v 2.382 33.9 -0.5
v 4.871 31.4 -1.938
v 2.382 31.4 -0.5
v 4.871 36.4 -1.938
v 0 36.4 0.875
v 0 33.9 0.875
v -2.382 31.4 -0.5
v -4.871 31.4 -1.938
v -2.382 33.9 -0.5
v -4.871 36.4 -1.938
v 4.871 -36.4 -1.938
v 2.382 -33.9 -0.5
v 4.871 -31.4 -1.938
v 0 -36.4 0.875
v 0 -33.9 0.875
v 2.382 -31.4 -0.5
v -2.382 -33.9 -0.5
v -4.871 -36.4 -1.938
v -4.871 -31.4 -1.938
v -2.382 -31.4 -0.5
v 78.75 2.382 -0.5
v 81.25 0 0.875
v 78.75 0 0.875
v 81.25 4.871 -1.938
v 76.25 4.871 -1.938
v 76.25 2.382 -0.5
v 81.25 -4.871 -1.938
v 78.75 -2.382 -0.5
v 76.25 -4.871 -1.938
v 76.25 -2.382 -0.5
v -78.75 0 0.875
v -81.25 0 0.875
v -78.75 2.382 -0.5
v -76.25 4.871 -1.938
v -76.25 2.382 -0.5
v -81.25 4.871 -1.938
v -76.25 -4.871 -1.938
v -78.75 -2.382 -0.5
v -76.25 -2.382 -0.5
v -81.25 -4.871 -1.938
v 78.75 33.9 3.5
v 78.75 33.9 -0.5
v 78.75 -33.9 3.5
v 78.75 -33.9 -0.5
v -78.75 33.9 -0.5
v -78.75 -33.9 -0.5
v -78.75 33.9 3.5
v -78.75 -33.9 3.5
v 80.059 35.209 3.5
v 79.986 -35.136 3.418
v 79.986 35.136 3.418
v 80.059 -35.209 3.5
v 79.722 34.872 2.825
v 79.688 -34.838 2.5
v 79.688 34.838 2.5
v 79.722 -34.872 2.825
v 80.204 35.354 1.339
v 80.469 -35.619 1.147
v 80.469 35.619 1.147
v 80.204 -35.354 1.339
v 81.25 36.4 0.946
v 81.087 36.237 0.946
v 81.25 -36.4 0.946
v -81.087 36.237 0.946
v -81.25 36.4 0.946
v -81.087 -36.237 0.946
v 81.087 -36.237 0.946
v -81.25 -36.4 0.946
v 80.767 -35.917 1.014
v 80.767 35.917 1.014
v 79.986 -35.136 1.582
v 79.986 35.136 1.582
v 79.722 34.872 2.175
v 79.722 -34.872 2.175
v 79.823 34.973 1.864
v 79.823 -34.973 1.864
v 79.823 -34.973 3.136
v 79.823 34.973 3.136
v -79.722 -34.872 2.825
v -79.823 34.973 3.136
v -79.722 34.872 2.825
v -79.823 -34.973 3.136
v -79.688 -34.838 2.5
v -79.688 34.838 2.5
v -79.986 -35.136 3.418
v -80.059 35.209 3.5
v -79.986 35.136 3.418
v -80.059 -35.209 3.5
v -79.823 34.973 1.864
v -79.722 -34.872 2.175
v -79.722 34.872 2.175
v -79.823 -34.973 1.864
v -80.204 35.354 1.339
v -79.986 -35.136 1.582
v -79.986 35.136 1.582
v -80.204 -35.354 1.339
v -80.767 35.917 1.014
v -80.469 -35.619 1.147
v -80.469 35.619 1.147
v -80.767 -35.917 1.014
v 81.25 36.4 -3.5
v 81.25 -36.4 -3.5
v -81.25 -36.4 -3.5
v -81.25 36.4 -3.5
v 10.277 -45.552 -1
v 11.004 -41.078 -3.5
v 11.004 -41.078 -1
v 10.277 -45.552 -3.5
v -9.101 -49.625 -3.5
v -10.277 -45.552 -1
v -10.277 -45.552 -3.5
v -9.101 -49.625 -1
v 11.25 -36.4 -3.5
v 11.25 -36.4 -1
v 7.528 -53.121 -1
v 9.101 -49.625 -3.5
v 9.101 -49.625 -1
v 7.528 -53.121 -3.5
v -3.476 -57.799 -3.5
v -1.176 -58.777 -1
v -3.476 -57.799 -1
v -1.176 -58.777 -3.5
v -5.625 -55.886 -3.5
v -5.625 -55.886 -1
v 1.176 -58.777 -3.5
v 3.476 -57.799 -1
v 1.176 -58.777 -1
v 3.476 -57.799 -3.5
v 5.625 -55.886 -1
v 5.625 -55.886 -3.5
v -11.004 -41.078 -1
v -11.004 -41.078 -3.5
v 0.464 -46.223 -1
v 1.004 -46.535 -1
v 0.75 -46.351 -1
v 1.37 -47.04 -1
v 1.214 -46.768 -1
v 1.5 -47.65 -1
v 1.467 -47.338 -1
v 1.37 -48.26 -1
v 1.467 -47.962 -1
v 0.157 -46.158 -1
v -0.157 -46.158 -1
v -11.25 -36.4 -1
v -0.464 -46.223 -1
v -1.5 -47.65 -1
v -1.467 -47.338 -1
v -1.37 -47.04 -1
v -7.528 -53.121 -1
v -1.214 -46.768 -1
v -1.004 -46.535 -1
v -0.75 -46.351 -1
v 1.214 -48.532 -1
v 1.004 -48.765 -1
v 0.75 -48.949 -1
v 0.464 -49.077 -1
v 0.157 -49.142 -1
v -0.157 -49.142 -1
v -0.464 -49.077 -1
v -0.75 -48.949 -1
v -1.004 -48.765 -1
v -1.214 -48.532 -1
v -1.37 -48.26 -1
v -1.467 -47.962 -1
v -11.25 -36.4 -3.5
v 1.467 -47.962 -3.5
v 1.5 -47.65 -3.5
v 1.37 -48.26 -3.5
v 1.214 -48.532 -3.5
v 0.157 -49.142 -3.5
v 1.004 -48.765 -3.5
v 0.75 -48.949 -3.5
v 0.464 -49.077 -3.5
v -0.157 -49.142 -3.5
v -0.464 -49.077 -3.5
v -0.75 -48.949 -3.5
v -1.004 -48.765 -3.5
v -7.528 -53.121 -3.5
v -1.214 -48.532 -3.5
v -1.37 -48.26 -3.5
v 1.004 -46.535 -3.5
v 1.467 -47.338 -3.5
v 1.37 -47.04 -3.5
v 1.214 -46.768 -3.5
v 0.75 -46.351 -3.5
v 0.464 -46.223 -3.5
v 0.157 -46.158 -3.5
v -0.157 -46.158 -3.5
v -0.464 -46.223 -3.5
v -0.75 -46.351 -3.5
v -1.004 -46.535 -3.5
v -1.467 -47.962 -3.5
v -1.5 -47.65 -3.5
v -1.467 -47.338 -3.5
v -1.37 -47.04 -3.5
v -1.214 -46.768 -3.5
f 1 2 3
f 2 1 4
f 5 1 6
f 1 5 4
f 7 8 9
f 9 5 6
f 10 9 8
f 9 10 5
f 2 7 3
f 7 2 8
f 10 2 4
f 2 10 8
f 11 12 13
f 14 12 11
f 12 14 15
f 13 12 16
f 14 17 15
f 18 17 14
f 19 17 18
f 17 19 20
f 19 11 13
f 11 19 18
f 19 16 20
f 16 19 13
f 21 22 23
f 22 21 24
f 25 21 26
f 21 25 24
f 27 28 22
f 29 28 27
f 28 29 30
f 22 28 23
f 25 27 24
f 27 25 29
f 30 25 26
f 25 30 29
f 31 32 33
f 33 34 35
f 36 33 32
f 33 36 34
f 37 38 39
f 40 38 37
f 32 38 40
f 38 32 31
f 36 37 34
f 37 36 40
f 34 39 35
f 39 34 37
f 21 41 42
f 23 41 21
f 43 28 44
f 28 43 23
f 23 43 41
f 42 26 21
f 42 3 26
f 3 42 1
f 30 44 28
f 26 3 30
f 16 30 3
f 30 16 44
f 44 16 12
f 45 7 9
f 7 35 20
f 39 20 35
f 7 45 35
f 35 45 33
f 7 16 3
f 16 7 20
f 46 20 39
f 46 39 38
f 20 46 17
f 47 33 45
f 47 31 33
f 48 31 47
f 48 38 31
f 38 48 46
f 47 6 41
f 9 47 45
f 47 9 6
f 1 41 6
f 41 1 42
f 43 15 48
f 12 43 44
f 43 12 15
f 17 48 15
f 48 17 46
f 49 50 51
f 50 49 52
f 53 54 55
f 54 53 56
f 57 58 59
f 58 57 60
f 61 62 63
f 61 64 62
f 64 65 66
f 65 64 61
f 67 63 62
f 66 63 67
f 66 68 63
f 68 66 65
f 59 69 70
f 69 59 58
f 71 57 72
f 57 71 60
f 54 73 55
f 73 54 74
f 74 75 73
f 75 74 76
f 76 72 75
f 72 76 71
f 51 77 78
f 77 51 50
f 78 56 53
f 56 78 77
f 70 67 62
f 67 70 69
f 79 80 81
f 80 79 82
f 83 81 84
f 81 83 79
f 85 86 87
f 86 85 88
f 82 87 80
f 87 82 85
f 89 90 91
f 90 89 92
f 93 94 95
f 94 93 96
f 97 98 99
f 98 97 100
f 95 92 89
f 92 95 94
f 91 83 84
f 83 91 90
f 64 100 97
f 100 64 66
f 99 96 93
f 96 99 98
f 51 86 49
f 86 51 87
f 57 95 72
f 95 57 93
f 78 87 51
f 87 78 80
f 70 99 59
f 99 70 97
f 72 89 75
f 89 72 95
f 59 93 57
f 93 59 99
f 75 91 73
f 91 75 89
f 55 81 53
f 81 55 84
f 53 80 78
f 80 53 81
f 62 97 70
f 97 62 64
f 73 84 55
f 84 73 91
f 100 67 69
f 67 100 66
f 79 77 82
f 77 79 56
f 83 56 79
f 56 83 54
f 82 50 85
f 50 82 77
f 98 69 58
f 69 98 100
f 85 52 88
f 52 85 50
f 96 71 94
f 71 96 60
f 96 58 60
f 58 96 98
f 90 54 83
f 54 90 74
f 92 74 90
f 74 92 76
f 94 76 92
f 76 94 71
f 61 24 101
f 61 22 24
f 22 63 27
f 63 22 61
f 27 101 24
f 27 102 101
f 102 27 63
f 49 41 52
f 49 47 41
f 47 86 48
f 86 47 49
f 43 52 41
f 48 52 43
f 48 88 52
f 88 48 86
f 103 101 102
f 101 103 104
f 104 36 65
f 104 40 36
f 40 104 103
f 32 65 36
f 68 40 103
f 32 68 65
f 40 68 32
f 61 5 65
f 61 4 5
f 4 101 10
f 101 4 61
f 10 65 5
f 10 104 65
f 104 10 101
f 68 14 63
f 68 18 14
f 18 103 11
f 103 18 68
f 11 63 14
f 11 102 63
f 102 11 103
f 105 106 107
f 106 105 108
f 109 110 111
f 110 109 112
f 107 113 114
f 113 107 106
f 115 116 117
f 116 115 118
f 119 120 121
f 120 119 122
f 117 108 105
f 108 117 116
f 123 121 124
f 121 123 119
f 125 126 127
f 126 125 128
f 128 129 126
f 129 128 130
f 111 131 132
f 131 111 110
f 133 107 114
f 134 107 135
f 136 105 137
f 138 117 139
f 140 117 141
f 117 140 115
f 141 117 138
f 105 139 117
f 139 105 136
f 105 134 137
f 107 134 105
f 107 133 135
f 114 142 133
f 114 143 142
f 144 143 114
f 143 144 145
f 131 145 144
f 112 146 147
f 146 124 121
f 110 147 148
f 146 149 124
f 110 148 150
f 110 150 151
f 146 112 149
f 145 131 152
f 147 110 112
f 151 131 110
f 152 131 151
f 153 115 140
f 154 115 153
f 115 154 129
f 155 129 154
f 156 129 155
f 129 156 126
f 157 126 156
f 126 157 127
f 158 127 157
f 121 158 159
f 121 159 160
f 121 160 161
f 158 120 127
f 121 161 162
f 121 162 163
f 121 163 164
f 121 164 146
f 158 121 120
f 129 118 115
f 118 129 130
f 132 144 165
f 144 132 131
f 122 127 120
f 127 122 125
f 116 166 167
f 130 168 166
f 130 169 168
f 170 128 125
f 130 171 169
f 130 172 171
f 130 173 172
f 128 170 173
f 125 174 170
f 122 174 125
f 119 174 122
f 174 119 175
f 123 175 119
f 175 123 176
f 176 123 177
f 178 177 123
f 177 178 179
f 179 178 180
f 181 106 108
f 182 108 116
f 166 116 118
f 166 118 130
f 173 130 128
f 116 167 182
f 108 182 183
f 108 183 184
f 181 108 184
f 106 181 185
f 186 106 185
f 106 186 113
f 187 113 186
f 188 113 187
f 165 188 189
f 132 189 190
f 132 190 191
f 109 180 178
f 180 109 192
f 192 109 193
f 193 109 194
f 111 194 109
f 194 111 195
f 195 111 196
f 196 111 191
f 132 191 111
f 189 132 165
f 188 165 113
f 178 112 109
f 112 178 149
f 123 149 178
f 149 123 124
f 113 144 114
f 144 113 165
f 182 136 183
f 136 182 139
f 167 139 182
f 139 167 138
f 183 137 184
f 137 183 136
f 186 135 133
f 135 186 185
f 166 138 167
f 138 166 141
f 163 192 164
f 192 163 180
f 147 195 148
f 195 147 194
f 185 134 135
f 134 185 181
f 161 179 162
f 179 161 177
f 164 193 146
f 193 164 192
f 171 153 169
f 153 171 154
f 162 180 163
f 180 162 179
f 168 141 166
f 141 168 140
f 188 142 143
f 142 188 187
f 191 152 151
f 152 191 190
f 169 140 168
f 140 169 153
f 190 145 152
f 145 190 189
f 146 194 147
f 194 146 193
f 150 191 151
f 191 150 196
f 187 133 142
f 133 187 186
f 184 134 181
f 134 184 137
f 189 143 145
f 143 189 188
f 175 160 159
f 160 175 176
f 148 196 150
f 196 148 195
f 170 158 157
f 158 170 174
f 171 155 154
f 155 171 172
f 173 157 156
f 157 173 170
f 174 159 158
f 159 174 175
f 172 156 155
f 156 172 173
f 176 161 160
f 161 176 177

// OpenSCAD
//------------------Variables------------------\\ 

		//----Global Values----\\
			//The default unit in OpenSCAD is mm and this unit variable allows one to change the variables in the code with units other than mm. Default is 1, for mm, but cm is 10 and inches is 25.4. Note that this entails that you change EVERY variable (except maybe sfn)  so that one piece of the model is not ridiculously bigger/smaller than the other parts. 
				unit=1;

			//The detail in the cylinders/spheres of the shape.
				sfn=30;

		//----Bill Specifics----\\

			//The length of the bill.
				billength= 157.5;

			//The width of the bill. 
				billwidth = 67.8;

			//The thickness of the frame. 
				framethick = 5;
			
			//Bottom Thickness
				botthick = 2 ;

		//----Frame Specifics----\\

			//The border of the frame length-wise. This is the measurement from the inside of the frame to the outisde on the length (x) axis. The cylinders that shape the frame use this measurement.
				xframe = 5;

			//The border of the frame width-wise. This is the measurement from the inside of the frame to the outisde on the width (y) axis.
				yframe = 5;
		
			//How prominent the frame shaping is. Play with this value. Default is 2.
				frameshapethick = 1.6;

			//How raised the frame shaping is. Play with this value as well. 
				frameshaperaise = 0;
		
	//----Paper clip slit size----\\\
		//Width of the paperclip slit. Adjust this value if as you want. 
		slitwidth = 10;
		
		//Height of the slit. This is actually a size control but it mainly changes the size.
		slitheight = 7.5;

		//Where the slit is. Slit is in the middle by default but depending on size you may have to raise or lower this value.
		slitlift =-3;

		//Shape of slit in sides. Default is 3 (triangle) as its overhangs are not unbearable.
		slitshape=3;

		//Slit scale (x,y,z)
		slitscalex= 0.5;
		slitscaley= 1.5;
		slitscalez= 1;
	
	//----Hook sizing----\\
		//Hook size
		hooksize=22.5;

		//Hook hole size
		hookhole=3;

		//Hook thickness
		hookthick=2.5;

//-------------------Modules-------------------\\ 

	//----Basic Frame Shapes----\\
		module bill() {
			cube([billength*unit, billwidth*unit,framethick*unit], center=true);
		}

		module outsideframe() { 
			cube([(billength+xframe)*unit, (billwidth+yframe)*unit, (framethick+botthick)*unit], center=true);
		}

	//----Frame shaping.----\\
		//Frame shaping cylinder on the X Axis.
			module xfsc() {
				cylinder(r=(framethick*unit)/(frameshapethick*2), h=(billwidth+yframe)*unit+xframe, center=true, $fn=sfn);
			}

		//Frame shaping cylinder on the Y Axis.
			module yfsc() {
				cylinder(r=(framethick*unit)/(frameshapethick*2), h=(billength+xframe)*unit+yframe, center=true, $fn=sfn);
			}

		//Frameshaping general module
			module frameshaping() {
				translate([(billength/2)*unit+xframe/2, 0, (framethick/2)*unit]) {
					rotate([90,0,0]) {
						xfsc();
					}
				}
				translate([(-billength/2)*unit-xframe/2, 0, (framethick/2)*unit]) {
					rotate([90,0,0]) {
						xfsc();
					}
				}

				translate([0, (billwidth/2)*unit+yframe/2, (framethick/2)*unit]) {
					rotate([90,0,90]) {
						yfsc();
					}
				}
				translate([0, (-billwidth/2)*unit-yframe/2, (framethick/2)*unit]) {
					rotate([90,0,90]) {
						yfsc();
					}
				}
			}

	



	//A slit on every side for a paper clip to hold it down
	module clipslit() {
		translate([0, ((billwidth+yframe)/2)*unit, slitlift*unit]) {
			rotate([0,270,90]) {
				scale([slitscalex,slitscaley,slitscalez]) {
					cylinder(r=(slitheight/2)*unit, h=slitwidth*unit, $fn=slitshape, center=true);
				}
			}
		}
		translate([0, ((billwidth+yframe)/2)*-unit, slitlift*unit]) {
			rotate([0,270,90]) {
				scale([slitscalex,slitscaley,slitscalez]) {
					cylinder(r=(slitheight/2)*unit, h=slitwidth*unit, $fn=slitshape, center=true);
				}
			}
		}
		translate([((billength+xframe)/2)*unit, 0, slitlift*unit]) {
			rotate([0,270,0]) {
				scale([slitscalex,slitscaley,slitscalez]) {
					cylinder(r=(slitheight/2)*unit, h=slitwidth*unit, $fn=slitshape, center=true);
				}
			}
		}
		translate([-unit*((billength+xframe)/2), 0, slitlift*unit]) {
			rotate([0,270,0]) {
				scale([slitscalex,slitscaley,slitscalez]) {
					cylinder(r=(slitheight/2)*unit, h=slitwidth*unit, $fn=slitshape, center=true);
				}
			}
		}				
	}

		
	module hook() {
		translate([0,-((billwidth+xframe)/2)*unit, (-(framethick+botthick)/2)*unit ]) {
			difference() {
				scale([1,2,1]) {
					cylinder(r=(hooksize/2)*unit, h=hookthick*unit, $fn=sfn);
				}
				translate([(-hooksize/2)*unit, 0]) {
					cube([hooksize*unit, hooksize*unit, hookthick*unit]);
				}
				translate([0, (-hooksize/2)*unit, 0]) {
					cylinder(r=(hookhole/2)*unit, h=hookthick*unit, $fn=sfn);
				}
			}
		}
	}


	//Plating module
	module frame() {
		difference() {
			outsideframe();
			translate([0,0, botthick]) {
				bill();
				clipslit();
			}
			translate([0,0, frameshaperaise]) {
				frameshaping();
			}
		}
	}

frame();
hook();
